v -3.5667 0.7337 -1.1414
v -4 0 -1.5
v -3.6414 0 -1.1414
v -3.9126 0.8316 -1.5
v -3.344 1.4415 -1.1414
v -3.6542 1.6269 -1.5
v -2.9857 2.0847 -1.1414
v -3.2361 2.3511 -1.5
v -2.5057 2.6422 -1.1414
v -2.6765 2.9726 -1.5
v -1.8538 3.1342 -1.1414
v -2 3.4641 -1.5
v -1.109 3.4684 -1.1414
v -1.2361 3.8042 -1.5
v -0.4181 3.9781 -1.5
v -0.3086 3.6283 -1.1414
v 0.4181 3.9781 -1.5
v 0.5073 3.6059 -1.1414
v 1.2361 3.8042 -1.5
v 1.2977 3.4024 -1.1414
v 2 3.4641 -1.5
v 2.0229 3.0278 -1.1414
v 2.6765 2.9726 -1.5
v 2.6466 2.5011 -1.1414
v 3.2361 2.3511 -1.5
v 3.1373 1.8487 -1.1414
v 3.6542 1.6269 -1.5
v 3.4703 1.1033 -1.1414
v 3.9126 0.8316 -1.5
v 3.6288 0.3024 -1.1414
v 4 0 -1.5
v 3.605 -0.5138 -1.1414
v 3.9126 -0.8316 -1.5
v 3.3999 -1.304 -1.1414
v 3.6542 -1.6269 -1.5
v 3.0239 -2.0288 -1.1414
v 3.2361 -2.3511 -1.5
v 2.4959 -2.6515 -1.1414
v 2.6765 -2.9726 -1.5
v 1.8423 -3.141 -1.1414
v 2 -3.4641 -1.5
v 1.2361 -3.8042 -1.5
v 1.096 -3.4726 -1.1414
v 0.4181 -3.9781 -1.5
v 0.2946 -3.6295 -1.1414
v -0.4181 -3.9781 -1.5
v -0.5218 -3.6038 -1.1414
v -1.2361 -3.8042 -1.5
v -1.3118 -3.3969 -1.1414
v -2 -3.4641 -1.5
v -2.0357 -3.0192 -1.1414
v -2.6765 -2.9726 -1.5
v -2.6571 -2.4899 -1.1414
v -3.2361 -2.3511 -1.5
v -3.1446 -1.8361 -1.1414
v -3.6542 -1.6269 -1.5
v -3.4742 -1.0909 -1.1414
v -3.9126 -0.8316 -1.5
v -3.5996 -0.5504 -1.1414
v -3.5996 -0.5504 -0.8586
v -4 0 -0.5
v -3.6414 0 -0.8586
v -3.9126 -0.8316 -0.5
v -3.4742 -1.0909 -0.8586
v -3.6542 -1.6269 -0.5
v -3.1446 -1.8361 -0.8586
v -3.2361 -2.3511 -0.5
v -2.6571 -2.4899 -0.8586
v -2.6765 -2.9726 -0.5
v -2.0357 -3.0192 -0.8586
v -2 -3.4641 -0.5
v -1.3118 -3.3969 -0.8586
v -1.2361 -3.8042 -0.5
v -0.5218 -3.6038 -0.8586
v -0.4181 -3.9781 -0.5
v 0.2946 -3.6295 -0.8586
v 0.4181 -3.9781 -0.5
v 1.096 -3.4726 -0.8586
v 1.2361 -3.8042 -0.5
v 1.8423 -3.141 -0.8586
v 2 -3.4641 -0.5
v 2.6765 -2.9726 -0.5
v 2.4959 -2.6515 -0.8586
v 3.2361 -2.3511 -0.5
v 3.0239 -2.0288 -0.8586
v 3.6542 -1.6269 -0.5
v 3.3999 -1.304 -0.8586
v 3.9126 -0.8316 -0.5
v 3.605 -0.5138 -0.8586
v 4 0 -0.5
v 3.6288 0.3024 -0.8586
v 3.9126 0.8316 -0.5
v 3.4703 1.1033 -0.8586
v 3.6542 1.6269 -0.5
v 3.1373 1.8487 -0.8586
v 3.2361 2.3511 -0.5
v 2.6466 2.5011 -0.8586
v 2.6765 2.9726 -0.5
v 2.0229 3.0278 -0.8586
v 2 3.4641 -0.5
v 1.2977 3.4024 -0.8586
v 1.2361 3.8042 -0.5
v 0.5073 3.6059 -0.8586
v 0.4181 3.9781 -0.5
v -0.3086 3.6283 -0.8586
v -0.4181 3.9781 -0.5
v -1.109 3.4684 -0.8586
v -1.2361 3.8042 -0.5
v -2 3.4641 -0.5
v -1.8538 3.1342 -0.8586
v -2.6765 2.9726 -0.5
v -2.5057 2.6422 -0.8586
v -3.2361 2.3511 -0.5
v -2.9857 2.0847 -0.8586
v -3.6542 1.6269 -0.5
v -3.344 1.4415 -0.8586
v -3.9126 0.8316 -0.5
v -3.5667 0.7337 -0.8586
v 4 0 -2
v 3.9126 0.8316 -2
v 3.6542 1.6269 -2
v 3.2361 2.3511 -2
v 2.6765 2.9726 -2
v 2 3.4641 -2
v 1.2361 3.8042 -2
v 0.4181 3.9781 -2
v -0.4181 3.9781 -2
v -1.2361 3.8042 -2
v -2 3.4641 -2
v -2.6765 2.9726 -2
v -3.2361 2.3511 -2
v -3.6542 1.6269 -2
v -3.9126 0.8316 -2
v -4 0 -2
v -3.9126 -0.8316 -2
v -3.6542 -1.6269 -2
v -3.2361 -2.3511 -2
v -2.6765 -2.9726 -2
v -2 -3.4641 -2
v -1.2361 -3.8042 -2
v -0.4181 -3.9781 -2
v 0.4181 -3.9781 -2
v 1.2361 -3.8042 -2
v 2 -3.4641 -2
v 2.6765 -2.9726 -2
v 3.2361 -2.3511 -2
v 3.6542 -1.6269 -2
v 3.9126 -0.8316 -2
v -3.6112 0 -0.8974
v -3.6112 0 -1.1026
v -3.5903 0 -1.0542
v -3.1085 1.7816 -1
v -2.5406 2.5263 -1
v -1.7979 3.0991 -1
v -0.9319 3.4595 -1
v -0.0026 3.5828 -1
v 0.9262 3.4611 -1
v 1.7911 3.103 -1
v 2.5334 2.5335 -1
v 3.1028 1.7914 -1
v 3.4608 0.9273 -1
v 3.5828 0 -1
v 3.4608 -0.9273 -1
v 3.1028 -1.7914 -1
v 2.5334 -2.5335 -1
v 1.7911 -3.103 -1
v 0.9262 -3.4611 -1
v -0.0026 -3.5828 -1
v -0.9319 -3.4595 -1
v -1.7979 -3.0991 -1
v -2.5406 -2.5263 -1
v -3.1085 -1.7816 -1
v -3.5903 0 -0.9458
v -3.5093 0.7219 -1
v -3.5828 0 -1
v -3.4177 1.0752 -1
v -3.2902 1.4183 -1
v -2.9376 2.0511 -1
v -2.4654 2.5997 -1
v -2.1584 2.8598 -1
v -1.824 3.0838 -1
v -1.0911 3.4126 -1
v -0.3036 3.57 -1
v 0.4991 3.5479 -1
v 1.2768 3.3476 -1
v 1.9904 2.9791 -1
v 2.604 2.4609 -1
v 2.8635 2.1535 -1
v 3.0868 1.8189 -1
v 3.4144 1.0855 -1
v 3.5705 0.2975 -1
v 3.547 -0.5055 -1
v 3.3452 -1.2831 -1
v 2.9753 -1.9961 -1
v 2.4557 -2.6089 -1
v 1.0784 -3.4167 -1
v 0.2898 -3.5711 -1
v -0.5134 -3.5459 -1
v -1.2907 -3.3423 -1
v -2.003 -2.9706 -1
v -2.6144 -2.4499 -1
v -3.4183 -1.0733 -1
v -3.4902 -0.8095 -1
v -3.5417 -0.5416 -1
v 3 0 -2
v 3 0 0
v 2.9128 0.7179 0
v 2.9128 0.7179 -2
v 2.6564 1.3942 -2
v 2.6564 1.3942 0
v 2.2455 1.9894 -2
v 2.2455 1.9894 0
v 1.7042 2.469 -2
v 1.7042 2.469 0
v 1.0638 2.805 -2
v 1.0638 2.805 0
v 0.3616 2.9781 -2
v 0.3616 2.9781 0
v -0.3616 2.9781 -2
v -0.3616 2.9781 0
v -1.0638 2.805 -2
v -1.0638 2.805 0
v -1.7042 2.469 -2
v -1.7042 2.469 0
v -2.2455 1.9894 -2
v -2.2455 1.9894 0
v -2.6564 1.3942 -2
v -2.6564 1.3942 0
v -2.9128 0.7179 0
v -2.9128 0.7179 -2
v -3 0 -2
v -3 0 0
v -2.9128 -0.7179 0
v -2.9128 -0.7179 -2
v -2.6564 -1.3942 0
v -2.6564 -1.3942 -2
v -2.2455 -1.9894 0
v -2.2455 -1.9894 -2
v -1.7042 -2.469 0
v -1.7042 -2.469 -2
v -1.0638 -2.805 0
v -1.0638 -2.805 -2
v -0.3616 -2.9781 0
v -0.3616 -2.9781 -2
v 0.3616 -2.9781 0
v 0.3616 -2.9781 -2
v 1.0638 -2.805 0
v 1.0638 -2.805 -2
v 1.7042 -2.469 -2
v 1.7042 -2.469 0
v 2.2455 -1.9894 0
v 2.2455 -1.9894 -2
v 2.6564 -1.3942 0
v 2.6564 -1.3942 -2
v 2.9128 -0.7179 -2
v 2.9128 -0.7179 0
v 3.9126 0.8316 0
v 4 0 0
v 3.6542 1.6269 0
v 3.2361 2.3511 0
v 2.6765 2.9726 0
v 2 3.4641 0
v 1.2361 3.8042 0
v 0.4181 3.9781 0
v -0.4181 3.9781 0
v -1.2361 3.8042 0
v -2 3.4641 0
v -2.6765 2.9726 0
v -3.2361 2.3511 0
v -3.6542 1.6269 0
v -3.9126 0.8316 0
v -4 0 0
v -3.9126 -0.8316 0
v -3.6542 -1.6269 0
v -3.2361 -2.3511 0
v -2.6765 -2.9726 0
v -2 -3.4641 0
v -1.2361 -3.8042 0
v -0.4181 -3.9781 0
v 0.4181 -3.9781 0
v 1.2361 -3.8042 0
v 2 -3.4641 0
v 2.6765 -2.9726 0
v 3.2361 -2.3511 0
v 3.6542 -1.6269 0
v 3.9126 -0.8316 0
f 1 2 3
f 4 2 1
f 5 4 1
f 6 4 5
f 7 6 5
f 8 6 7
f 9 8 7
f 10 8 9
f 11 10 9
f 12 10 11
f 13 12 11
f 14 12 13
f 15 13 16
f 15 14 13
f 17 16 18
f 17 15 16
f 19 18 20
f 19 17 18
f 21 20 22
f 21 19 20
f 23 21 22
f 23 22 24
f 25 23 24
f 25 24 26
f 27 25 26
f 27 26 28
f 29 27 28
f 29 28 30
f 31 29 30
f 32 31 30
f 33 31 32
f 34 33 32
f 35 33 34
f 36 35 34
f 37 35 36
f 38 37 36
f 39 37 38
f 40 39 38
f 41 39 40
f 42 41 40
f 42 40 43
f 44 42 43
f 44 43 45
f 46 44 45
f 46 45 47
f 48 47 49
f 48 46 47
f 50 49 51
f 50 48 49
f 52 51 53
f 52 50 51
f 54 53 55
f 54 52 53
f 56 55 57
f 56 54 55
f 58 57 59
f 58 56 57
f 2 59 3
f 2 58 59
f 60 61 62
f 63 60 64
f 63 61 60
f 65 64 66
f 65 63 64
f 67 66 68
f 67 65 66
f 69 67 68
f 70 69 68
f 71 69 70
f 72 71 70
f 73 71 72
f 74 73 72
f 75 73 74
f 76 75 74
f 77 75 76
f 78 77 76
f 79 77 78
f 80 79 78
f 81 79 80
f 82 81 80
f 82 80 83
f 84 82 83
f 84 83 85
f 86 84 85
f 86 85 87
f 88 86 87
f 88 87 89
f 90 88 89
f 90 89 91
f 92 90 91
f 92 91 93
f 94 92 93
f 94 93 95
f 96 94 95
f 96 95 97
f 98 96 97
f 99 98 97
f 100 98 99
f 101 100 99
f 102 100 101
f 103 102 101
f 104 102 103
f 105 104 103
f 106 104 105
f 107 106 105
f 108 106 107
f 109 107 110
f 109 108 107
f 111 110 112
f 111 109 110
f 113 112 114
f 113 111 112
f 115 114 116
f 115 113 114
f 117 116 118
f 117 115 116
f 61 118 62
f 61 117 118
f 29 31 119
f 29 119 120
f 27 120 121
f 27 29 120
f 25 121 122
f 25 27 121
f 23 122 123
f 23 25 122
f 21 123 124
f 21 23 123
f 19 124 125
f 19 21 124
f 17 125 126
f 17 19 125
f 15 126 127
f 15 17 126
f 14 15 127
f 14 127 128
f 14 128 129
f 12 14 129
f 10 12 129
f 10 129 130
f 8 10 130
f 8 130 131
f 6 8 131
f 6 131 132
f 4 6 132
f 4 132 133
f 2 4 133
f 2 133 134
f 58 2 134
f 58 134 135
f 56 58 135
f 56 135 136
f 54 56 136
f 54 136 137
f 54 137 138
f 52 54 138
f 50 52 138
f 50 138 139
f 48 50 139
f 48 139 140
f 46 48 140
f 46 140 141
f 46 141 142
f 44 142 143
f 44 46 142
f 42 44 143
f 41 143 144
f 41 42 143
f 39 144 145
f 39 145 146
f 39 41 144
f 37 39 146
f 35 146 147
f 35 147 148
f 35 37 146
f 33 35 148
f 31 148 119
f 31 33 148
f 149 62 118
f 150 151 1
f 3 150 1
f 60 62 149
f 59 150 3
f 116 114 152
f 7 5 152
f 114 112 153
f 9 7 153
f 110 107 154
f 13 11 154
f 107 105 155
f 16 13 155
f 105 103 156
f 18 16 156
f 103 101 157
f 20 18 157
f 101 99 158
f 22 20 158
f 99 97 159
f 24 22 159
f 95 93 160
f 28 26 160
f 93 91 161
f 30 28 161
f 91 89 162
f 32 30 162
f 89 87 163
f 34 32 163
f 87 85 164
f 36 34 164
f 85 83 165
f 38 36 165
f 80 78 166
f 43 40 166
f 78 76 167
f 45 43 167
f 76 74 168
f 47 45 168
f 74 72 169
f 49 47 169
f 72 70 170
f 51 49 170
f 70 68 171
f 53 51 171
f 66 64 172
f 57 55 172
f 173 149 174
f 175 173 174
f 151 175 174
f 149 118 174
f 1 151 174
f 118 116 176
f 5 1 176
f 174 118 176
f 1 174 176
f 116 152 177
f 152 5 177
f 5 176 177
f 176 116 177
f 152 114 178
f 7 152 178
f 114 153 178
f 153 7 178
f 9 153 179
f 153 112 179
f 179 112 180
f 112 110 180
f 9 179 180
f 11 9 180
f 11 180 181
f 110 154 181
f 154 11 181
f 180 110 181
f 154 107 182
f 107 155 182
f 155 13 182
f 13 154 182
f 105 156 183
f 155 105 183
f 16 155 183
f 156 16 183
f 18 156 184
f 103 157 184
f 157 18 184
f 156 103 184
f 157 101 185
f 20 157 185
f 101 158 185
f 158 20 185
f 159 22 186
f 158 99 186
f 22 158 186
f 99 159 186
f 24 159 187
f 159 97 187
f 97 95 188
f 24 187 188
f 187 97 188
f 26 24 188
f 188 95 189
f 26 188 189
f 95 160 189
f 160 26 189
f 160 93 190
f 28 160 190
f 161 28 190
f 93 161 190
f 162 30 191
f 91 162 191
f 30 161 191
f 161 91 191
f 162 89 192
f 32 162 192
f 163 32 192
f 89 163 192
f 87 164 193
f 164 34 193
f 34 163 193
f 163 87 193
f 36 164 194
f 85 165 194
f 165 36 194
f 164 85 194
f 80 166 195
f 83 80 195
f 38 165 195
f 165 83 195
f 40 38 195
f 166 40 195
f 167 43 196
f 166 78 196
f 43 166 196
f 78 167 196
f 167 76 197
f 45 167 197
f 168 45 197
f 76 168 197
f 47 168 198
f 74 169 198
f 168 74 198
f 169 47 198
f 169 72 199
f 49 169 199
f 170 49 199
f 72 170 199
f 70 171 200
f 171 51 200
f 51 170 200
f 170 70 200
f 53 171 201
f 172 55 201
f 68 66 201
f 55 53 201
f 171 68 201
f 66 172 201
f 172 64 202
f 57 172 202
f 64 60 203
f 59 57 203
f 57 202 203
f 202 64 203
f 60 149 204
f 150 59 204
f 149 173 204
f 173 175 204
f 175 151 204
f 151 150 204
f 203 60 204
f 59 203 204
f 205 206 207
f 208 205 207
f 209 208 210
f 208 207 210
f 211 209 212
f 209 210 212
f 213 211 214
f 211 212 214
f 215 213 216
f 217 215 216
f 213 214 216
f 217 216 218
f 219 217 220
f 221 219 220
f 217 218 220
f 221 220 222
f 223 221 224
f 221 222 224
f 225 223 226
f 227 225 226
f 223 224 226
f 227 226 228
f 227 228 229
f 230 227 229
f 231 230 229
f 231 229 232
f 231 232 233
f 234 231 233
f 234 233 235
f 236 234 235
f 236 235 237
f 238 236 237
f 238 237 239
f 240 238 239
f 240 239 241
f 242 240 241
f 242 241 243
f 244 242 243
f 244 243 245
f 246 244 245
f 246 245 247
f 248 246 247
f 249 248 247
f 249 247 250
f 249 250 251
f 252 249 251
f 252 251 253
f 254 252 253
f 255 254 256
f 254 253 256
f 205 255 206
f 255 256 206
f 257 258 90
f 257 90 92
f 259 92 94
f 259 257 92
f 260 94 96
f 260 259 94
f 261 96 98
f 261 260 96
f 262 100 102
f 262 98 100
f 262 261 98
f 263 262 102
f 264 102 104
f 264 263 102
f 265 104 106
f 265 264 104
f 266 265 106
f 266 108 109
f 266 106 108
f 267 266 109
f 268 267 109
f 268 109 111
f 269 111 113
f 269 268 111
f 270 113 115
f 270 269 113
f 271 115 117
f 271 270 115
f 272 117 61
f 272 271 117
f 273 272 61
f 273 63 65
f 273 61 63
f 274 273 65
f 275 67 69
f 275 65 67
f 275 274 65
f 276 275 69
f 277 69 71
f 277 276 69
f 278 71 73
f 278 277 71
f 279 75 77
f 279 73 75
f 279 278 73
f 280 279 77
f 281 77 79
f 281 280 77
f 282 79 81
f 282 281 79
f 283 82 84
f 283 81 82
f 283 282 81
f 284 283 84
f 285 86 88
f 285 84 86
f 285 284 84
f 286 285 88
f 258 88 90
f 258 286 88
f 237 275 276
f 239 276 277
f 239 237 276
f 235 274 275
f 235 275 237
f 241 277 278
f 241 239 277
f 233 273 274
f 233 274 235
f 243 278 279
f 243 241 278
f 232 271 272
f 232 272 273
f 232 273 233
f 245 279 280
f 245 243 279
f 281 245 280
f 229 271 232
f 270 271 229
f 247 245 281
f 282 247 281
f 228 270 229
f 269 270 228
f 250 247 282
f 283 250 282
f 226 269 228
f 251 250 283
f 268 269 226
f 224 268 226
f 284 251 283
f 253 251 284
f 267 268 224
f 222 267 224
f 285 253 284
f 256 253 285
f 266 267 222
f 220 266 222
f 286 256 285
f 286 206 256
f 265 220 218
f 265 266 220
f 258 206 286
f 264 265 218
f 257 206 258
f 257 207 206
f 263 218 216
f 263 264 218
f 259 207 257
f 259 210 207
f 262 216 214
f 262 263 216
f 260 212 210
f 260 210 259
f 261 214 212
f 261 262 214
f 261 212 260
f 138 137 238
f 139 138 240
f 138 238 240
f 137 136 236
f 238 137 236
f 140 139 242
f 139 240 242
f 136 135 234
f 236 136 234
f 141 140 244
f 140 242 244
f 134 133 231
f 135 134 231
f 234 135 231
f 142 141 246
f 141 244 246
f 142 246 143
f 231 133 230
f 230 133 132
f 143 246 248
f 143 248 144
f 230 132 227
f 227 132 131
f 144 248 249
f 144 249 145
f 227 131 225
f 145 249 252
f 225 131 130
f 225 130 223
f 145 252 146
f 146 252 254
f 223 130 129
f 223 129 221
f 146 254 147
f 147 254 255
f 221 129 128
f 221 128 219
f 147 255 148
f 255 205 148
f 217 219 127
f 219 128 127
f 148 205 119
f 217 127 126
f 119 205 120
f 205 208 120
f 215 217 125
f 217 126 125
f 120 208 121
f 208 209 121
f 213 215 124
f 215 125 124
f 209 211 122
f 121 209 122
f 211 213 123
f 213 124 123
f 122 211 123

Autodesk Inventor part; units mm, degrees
ref_plane "YZ Plane" through (0, 0, 0) normal (1, 0, 0) x (0, 1, 0)
ref_plane "XZ Plane" through (0, 0, 0) normal (0, 1, 0) x (-1, 0, 0)
ref_plane "XY Plane" through (0, 0, 0) normal (0, 0, 1) x (1, 0, 0)
sketch "Sketch1" plane through (0, 0, 0) normal (0, 0, 1) x (1, 0, 0)
  circle A0 centre (0, 0) radius 3 projected
  circle A1 centre (0, 0) radius 3
  circle A2 centre (0, 0) radius 4
  point P0 (0, 0)
  dimension "d0" = 6
  dimension "d1" = 8
extrude "Extrusion1" add sketch "Sketch1" against normal blind 2
ref_plane "Work Plane1" through (0, 0, -1) normal (0, 0, 1) x (1, 0, 0)
sketch "Sketch2" plane through (0, 0, 0) normal (0, 1, 0) x (-1, 0, 0)
  line L0 (4, 0) -> (4, -2) projected
  line L1 (4, -1) -> (3.5, -1)
  line L2 (4, -1) -> (4, -1.5)
  line L3 (4, -1) -> (4, -0.5)
  line L4 (4, -0.5) -> (3.5, -1)
  line L5 (4, -1.5) -> (3.5, -1)
  line L6 (0, 0) -> (0, -2)
  line L7 (-4, -2) -> (4, -2) projected
  dimension "d4" = 0.5
  dimension "d5" = 0.5
  dimension "d6" = 0.5
revolve "Revolution1" cut sketch "Sketch2" angle 360 about axis through (0, 0, 0) along (0, 0, -1)
fillet "Fillet1" radius 0.2 1 edges at (3.5, 0, -1)
properties part number "c_roller_1"
